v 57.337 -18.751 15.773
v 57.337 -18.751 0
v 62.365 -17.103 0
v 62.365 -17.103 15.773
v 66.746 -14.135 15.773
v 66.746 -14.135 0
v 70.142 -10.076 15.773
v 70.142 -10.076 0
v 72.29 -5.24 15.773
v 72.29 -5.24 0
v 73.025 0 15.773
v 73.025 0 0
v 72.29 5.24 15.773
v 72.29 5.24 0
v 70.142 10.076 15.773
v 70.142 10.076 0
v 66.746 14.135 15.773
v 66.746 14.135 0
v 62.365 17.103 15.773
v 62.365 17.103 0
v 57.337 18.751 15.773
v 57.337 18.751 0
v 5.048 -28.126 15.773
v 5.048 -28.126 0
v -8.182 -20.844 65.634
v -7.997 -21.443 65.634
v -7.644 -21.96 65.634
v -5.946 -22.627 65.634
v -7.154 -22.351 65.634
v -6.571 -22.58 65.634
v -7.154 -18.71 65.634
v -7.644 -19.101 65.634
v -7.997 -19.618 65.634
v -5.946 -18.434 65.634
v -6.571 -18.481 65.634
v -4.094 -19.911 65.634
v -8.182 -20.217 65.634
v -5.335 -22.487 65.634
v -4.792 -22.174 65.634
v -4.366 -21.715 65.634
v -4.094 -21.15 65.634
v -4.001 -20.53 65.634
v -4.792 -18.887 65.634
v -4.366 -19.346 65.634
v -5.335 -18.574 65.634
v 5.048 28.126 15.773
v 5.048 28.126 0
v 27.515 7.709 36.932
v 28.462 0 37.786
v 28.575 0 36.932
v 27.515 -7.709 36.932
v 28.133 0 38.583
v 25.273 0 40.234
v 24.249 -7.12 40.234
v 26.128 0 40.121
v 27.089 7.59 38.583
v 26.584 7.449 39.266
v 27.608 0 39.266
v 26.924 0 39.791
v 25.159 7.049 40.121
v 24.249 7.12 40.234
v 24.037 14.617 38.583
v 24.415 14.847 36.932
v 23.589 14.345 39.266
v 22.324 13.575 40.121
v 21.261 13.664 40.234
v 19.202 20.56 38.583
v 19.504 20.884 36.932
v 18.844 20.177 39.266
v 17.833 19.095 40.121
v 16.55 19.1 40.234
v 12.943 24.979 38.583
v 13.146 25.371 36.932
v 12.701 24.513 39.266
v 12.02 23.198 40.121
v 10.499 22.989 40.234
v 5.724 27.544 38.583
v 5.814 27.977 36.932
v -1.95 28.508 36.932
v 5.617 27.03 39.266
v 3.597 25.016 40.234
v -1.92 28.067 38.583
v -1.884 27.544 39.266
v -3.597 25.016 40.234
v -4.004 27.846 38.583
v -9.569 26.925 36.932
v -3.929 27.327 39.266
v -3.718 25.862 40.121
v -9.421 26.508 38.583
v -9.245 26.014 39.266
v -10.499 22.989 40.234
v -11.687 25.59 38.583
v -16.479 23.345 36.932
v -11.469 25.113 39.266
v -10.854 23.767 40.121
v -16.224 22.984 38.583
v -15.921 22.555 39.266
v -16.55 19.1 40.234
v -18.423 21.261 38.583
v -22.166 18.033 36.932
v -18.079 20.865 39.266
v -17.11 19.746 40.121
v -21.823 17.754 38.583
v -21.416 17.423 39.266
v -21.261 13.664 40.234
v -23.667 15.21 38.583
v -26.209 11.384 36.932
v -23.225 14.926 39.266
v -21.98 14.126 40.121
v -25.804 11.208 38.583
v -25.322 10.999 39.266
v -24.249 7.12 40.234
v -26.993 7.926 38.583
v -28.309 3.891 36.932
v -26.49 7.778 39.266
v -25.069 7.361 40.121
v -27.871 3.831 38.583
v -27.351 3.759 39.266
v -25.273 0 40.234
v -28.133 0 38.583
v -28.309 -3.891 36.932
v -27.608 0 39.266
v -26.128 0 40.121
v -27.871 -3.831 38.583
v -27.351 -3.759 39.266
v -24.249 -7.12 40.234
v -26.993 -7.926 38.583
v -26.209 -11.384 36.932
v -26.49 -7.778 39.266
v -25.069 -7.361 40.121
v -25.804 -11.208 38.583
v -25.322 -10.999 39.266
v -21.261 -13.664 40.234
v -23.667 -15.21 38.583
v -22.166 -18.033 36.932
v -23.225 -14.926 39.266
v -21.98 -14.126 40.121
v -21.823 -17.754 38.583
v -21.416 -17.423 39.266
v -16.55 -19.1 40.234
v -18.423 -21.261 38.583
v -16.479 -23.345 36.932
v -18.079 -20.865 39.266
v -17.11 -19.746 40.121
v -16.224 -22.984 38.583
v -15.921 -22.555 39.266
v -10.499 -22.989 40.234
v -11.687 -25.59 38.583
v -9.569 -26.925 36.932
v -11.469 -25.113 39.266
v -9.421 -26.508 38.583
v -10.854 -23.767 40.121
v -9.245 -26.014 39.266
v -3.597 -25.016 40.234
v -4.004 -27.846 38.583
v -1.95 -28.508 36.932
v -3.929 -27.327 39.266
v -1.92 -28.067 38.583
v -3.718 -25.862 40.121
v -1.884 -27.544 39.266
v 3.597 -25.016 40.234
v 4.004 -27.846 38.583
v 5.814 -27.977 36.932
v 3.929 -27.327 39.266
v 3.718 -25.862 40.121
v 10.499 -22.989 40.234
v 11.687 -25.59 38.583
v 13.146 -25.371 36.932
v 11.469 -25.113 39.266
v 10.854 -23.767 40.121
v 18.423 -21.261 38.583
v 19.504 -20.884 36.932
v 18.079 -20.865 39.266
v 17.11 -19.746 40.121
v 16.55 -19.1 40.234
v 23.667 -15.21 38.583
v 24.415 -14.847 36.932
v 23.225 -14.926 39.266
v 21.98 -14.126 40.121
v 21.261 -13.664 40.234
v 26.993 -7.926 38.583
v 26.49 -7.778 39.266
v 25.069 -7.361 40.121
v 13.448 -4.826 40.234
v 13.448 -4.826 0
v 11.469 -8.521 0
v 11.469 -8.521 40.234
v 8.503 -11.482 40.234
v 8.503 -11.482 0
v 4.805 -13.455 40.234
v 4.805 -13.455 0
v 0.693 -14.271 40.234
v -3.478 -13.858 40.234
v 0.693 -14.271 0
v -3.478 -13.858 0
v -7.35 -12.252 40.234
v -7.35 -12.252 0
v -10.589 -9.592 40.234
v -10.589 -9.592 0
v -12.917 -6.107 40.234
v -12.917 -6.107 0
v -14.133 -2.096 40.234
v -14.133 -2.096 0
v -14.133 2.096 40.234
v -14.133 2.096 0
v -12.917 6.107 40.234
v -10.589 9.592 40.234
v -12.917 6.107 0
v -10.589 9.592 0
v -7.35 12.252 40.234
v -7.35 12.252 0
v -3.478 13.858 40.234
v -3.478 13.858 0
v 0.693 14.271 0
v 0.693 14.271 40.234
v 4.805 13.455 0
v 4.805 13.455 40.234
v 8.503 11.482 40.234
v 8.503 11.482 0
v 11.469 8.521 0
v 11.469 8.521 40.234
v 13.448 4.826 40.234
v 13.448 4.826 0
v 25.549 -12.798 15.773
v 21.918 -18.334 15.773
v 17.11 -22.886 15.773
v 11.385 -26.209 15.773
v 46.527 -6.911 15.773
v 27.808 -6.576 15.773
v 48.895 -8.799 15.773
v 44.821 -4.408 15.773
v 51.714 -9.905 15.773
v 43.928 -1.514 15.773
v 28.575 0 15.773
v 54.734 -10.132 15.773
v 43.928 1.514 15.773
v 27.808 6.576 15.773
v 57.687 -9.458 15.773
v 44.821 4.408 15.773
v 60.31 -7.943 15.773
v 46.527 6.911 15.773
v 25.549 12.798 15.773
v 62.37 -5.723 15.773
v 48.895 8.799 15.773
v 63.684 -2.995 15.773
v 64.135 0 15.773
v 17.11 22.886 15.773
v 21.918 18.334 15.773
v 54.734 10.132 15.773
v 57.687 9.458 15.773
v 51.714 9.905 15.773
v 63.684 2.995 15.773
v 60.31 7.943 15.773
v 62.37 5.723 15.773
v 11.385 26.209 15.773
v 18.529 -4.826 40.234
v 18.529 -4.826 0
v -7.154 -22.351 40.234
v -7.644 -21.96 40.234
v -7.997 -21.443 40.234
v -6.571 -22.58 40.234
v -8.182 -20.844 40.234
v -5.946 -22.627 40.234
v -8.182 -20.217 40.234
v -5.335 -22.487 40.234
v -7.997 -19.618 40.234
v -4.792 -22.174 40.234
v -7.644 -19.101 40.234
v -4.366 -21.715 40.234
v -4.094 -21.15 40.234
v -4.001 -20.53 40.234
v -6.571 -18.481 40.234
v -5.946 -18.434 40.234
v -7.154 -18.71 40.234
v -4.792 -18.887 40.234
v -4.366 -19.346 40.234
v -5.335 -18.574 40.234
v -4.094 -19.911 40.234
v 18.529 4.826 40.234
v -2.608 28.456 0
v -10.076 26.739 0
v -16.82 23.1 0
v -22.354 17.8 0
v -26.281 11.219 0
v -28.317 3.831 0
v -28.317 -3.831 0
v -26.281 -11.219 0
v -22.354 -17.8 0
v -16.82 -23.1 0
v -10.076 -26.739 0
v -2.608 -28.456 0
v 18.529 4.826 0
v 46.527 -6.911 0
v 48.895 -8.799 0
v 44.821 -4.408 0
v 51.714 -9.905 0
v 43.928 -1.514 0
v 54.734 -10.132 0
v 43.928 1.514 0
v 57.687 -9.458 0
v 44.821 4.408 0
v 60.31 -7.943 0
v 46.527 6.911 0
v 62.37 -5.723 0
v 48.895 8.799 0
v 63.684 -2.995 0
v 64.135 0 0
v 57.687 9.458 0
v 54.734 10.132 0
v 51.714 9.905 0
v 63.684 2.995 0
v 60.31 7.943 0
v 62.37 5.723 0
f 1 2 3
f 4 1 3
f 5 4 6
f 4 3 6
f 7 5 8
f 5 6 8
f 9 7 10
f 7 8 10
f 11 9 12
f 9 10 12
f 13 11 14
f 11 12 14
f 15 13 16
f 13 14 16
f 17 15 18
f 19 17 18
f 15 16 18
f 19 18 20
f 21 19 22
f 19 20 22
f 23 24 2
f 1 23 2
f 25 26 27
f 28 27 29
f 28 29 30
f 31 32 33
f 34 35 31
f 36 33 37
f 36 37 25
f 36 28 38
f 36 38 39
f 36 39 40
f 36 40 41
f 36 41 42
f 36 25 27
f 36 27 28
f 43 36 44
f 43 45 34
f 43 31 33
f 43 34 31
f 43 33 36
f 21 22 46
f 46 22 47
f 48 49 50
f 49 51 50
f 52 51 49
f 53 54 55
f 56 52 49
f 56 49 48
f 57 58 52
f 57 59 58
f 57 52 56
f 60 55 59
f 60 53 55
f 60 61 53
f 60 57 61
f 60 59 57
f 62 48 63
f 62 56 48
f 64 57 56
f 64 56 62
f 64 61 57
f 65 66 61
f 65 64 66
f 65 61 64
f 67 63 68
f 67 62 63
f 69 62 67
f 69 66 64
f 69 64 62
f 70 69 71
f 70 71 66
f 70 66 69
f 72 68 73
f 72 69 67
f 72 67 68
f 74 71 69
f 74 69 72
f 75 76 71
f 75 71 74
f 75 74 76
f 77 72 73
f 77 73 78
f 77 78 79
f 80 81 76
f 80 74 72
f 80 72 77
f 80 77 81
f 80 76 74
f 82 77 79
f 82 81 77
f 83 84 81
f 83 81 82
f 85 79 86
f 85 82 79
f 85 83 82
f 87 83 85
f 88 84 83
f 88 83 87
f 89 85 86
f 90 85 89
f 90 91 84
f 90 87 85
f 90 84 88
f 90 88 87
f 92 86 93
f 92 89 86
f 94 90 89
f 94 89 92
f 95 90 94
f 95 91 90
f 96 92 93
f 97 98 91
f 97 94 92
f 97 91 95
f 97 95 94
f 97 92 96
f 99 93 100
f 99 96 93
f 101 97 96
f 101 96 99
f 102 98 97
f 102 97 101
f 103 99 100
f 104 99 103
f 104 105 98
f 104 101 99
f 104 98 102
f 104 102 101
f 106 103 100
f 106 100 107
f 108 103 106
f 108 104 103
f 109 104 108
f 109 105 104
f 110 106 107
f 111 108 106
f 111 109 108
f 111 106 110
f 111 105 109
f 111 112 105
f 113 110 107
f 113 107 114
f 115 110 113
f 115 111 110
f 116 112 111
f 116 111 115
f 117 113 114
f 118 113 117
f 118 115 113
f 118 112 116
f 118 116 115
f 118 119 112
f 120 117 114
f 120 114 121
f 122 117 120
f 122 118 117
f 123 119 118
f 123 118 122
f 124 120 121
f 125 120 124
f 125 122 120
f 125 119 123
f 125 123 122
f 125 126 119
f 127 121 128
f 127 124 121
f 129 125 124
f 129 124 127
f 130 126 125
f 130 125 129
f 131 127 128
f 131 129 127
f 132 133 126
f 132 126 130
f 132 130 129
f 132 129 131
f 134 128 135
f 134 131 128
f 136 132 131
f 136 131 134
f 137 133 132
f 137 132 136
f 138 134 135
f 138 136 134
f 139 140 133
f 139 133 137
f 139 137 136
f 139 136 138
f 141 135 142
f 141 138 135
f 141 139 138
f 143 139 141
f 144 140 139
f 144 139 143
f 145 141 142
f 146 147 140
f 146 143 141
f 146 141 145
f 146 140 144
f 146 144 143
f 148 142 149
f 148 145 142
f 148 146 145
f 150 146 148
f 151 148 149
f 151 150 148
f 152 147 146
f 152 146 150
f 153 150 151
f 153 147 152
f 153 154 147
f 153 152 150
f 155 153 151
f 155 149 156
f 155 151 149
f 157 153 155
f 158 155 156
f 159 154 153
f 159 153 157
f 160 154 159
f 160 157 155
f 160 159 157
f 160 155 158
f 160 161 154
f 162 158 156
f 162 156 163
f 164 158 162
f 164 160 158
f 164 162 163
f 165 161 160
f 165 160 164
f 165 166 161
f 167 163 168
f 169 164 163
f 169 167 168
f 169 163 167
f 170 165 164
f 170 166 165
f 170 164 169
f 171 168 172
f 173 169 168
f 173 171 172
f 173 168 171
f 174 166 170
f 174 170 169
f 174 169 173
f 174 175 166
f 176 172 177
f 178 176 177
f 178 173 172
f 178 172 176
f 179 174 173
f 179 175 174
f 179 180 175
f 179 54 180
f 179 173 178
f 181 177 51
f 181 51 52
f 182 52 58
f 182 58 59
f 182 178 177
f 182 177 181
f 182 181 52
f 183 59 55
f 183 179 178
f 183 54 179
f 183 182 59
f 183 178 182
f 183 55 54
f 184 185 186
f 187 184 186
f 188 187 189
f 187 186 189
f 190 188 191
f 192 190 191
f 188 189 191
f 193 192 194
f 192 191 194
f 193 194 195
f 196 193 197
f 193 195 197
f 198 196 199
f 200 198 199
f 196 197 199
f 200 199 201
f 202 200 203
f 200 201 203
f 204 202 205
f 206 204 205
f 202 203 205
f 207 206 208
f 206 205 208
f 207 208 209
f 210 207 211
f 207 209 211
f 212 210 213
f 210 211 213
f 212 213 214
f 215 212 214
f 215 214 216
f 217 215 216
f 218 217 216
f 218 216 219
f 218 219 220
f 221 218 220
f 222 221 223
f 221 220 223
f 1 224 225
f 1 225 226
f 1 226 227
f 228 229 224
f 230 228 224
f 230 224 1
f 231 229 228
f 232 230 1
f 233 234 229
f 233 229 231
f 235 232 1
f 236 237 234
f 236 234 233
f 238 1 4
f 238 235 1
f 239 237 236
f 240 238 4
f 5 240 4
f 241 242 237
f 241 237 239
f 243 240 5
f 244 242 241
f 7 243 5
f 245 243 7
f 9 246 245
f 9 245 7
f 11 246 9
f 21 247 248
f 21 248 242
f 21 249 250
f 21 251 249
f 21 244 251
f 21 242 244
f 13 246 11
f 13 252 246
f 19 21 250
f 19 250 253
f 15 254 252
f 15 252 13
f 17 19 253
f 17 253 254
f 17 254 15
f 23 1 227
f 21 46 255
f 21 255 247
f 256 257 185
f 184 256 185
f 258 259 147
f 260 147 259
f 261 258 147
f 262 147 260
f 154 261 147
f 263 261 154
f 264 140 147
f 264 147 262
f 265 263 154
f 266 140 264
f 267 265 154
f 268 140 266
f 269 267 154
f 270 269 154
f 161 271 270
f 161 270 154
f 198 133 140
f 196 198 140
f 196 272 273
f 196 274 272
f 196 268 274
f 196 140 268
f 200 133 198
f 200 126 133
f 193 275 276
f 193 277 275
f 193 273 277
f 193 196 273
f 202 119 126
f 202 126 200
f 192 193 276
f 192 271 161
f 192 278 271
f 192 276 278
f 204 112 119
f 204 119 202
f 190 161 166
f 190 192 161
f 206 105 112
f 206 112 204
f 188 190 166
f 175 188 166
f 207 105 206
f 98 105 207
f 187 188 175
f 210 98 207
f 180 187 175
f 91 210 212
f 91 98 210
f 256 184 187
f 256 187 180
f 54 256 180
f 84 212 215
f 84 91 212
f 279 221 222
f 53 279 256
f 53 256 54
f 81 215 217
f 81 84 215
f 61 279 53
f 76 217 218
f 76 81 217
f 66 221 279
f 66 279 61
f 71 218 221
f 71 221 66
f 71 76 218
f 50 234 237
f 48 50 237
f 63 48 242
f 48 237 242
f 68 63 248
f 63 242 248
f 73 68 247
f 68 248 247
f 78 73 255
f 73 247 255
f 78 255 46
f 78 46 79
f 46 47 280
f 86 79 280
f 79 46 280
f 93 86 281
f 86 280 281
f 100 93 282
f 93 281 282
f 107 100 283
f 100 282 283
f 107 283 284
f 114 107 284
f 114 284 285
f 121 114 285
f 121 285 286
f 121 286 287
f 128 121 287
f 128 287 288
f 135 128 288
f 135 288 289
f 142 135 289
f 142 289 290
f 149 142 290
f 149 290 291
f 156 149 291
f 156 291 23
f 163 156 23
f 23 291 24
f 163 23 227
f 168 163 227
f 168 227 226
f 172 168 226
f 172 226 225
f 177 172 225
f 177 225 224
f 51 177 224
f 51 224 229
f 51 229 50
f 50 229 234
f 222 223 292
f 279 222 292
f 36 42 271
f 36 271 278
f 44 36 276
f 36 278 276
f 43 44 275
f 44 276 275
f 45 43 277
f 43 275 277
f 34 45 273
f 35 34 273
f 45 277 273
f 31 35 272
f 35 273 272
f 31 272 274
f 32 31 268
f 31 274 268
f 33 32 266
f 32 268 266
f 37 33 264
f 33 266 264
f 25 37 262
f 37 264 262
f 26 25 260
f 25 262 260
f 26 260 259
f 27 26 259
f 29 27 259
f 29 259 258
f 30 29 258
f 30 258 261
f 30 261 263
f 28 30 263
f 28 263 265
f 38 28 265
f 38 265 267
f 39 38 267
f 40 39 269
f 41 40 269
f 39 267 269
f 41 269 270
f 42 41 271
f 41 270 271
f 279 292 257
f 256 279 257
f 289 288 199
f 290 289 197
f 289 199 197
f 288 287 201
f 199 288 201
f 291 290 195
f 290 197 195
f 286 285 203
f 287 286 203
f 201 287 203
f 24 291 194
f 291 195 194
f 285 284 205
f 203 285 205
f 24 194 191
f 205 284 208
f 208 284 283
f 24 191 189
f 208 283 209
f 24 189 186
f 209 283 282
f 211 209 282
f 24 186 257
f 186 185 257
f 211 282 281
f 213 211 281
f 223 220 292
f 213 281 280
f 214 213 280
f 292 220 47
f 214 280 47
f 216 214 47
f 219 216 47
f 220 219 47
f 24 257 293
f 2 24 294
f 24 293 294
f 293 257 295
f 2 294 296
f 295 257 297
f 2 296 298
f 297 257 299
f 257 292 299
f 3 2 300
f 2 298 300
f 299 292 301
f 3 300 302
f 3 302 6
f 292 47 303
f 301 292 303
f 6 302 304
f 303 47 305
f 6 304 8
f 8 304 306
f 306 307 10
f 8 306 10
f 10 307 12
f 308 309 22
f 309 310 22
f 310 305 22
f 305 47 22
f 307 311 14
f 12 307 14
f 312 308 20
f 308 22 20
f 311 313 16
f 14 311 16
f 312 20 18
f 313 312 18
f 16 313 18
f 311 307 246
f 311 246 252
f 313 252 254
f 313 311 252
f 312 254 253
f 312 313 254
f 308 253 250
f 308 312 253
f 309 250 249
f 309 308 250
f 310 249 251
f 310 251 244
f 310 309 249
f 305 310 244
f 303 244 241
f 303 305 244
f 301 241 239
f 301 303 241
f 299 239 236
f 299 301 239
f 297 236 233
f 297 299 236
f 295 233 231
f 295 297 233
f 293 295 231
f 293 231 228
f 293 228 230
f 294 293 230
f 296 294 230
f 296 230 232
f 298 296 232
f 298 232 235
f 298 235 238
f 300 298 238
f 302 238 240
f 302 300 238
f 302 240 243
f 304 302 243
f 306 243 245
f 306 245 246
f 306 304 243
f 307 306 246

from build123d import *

# Parameters (mm, degrees)
F0_R     = 28.575
F1_DEPTH = 40.2336
F2_R     = 10.16
F3_DEPTH = 15.7734
F4_R     = 3.302
F5_R     = 2.102171
F6_DEPTH = 25.4


with BuildPart() as f1:
    # F0 (on Top) → F1 (new body)
    with BuildSketch(Plane.XY):
        Circle(F0_R)
        with BuildLine():
            ThreePointArc((13.447765, -4.826), (-14.2875, 0), (13.447765, 4.826))
            Line((13.447765, 4.826), (18.5293, 4.826))
            Line((18.5293, 4.826), (18.5293, -4.826))
            Line((18.5293, -4.826), (13.447765, -4.826))
        make_face(mode=Mode.SUBTRACT)
    extrude(amount=F1_DEPTH)

    # F2 (on Top) → F3 (join)
    with BuildSketch(Plane.XY):
        with BuildLine():
            Line((5.042647, -28.126541), (57.336765, -18.751028))
            ThreePointArc((57.336765, -18.751028), (73.025, 0), (57.336765, 18.751028))
            Line((57.336765, 18.751028), (5.042647, 28.126541))
            ThreePointArc((5.042647, 28.126541), (28.575, 0), (5.042647, -28.126541))
        make_face()
        with Locations((53.975, 0)):
            Circle(F2_R, mode=Mode.SUBTRACT)
    extrude(amount=F3_DEPTH)

    # F4
    f4_edges = [f1.edges().sort_by_distance(p)[0] for p in [
        (-28.575, 0, 40.2336),
    ]]
    fillet(f4_edges, radius=F4_R)

    # F5 (on face) → F6 (join)
    with BuildSketch(Plane.XY.offset(40.2336)):
        with Locations((-6.10288, -20.530477)):
            Circle(F5_R)
    extrude(amount=F6_DEPTH)


solid = f1.part
